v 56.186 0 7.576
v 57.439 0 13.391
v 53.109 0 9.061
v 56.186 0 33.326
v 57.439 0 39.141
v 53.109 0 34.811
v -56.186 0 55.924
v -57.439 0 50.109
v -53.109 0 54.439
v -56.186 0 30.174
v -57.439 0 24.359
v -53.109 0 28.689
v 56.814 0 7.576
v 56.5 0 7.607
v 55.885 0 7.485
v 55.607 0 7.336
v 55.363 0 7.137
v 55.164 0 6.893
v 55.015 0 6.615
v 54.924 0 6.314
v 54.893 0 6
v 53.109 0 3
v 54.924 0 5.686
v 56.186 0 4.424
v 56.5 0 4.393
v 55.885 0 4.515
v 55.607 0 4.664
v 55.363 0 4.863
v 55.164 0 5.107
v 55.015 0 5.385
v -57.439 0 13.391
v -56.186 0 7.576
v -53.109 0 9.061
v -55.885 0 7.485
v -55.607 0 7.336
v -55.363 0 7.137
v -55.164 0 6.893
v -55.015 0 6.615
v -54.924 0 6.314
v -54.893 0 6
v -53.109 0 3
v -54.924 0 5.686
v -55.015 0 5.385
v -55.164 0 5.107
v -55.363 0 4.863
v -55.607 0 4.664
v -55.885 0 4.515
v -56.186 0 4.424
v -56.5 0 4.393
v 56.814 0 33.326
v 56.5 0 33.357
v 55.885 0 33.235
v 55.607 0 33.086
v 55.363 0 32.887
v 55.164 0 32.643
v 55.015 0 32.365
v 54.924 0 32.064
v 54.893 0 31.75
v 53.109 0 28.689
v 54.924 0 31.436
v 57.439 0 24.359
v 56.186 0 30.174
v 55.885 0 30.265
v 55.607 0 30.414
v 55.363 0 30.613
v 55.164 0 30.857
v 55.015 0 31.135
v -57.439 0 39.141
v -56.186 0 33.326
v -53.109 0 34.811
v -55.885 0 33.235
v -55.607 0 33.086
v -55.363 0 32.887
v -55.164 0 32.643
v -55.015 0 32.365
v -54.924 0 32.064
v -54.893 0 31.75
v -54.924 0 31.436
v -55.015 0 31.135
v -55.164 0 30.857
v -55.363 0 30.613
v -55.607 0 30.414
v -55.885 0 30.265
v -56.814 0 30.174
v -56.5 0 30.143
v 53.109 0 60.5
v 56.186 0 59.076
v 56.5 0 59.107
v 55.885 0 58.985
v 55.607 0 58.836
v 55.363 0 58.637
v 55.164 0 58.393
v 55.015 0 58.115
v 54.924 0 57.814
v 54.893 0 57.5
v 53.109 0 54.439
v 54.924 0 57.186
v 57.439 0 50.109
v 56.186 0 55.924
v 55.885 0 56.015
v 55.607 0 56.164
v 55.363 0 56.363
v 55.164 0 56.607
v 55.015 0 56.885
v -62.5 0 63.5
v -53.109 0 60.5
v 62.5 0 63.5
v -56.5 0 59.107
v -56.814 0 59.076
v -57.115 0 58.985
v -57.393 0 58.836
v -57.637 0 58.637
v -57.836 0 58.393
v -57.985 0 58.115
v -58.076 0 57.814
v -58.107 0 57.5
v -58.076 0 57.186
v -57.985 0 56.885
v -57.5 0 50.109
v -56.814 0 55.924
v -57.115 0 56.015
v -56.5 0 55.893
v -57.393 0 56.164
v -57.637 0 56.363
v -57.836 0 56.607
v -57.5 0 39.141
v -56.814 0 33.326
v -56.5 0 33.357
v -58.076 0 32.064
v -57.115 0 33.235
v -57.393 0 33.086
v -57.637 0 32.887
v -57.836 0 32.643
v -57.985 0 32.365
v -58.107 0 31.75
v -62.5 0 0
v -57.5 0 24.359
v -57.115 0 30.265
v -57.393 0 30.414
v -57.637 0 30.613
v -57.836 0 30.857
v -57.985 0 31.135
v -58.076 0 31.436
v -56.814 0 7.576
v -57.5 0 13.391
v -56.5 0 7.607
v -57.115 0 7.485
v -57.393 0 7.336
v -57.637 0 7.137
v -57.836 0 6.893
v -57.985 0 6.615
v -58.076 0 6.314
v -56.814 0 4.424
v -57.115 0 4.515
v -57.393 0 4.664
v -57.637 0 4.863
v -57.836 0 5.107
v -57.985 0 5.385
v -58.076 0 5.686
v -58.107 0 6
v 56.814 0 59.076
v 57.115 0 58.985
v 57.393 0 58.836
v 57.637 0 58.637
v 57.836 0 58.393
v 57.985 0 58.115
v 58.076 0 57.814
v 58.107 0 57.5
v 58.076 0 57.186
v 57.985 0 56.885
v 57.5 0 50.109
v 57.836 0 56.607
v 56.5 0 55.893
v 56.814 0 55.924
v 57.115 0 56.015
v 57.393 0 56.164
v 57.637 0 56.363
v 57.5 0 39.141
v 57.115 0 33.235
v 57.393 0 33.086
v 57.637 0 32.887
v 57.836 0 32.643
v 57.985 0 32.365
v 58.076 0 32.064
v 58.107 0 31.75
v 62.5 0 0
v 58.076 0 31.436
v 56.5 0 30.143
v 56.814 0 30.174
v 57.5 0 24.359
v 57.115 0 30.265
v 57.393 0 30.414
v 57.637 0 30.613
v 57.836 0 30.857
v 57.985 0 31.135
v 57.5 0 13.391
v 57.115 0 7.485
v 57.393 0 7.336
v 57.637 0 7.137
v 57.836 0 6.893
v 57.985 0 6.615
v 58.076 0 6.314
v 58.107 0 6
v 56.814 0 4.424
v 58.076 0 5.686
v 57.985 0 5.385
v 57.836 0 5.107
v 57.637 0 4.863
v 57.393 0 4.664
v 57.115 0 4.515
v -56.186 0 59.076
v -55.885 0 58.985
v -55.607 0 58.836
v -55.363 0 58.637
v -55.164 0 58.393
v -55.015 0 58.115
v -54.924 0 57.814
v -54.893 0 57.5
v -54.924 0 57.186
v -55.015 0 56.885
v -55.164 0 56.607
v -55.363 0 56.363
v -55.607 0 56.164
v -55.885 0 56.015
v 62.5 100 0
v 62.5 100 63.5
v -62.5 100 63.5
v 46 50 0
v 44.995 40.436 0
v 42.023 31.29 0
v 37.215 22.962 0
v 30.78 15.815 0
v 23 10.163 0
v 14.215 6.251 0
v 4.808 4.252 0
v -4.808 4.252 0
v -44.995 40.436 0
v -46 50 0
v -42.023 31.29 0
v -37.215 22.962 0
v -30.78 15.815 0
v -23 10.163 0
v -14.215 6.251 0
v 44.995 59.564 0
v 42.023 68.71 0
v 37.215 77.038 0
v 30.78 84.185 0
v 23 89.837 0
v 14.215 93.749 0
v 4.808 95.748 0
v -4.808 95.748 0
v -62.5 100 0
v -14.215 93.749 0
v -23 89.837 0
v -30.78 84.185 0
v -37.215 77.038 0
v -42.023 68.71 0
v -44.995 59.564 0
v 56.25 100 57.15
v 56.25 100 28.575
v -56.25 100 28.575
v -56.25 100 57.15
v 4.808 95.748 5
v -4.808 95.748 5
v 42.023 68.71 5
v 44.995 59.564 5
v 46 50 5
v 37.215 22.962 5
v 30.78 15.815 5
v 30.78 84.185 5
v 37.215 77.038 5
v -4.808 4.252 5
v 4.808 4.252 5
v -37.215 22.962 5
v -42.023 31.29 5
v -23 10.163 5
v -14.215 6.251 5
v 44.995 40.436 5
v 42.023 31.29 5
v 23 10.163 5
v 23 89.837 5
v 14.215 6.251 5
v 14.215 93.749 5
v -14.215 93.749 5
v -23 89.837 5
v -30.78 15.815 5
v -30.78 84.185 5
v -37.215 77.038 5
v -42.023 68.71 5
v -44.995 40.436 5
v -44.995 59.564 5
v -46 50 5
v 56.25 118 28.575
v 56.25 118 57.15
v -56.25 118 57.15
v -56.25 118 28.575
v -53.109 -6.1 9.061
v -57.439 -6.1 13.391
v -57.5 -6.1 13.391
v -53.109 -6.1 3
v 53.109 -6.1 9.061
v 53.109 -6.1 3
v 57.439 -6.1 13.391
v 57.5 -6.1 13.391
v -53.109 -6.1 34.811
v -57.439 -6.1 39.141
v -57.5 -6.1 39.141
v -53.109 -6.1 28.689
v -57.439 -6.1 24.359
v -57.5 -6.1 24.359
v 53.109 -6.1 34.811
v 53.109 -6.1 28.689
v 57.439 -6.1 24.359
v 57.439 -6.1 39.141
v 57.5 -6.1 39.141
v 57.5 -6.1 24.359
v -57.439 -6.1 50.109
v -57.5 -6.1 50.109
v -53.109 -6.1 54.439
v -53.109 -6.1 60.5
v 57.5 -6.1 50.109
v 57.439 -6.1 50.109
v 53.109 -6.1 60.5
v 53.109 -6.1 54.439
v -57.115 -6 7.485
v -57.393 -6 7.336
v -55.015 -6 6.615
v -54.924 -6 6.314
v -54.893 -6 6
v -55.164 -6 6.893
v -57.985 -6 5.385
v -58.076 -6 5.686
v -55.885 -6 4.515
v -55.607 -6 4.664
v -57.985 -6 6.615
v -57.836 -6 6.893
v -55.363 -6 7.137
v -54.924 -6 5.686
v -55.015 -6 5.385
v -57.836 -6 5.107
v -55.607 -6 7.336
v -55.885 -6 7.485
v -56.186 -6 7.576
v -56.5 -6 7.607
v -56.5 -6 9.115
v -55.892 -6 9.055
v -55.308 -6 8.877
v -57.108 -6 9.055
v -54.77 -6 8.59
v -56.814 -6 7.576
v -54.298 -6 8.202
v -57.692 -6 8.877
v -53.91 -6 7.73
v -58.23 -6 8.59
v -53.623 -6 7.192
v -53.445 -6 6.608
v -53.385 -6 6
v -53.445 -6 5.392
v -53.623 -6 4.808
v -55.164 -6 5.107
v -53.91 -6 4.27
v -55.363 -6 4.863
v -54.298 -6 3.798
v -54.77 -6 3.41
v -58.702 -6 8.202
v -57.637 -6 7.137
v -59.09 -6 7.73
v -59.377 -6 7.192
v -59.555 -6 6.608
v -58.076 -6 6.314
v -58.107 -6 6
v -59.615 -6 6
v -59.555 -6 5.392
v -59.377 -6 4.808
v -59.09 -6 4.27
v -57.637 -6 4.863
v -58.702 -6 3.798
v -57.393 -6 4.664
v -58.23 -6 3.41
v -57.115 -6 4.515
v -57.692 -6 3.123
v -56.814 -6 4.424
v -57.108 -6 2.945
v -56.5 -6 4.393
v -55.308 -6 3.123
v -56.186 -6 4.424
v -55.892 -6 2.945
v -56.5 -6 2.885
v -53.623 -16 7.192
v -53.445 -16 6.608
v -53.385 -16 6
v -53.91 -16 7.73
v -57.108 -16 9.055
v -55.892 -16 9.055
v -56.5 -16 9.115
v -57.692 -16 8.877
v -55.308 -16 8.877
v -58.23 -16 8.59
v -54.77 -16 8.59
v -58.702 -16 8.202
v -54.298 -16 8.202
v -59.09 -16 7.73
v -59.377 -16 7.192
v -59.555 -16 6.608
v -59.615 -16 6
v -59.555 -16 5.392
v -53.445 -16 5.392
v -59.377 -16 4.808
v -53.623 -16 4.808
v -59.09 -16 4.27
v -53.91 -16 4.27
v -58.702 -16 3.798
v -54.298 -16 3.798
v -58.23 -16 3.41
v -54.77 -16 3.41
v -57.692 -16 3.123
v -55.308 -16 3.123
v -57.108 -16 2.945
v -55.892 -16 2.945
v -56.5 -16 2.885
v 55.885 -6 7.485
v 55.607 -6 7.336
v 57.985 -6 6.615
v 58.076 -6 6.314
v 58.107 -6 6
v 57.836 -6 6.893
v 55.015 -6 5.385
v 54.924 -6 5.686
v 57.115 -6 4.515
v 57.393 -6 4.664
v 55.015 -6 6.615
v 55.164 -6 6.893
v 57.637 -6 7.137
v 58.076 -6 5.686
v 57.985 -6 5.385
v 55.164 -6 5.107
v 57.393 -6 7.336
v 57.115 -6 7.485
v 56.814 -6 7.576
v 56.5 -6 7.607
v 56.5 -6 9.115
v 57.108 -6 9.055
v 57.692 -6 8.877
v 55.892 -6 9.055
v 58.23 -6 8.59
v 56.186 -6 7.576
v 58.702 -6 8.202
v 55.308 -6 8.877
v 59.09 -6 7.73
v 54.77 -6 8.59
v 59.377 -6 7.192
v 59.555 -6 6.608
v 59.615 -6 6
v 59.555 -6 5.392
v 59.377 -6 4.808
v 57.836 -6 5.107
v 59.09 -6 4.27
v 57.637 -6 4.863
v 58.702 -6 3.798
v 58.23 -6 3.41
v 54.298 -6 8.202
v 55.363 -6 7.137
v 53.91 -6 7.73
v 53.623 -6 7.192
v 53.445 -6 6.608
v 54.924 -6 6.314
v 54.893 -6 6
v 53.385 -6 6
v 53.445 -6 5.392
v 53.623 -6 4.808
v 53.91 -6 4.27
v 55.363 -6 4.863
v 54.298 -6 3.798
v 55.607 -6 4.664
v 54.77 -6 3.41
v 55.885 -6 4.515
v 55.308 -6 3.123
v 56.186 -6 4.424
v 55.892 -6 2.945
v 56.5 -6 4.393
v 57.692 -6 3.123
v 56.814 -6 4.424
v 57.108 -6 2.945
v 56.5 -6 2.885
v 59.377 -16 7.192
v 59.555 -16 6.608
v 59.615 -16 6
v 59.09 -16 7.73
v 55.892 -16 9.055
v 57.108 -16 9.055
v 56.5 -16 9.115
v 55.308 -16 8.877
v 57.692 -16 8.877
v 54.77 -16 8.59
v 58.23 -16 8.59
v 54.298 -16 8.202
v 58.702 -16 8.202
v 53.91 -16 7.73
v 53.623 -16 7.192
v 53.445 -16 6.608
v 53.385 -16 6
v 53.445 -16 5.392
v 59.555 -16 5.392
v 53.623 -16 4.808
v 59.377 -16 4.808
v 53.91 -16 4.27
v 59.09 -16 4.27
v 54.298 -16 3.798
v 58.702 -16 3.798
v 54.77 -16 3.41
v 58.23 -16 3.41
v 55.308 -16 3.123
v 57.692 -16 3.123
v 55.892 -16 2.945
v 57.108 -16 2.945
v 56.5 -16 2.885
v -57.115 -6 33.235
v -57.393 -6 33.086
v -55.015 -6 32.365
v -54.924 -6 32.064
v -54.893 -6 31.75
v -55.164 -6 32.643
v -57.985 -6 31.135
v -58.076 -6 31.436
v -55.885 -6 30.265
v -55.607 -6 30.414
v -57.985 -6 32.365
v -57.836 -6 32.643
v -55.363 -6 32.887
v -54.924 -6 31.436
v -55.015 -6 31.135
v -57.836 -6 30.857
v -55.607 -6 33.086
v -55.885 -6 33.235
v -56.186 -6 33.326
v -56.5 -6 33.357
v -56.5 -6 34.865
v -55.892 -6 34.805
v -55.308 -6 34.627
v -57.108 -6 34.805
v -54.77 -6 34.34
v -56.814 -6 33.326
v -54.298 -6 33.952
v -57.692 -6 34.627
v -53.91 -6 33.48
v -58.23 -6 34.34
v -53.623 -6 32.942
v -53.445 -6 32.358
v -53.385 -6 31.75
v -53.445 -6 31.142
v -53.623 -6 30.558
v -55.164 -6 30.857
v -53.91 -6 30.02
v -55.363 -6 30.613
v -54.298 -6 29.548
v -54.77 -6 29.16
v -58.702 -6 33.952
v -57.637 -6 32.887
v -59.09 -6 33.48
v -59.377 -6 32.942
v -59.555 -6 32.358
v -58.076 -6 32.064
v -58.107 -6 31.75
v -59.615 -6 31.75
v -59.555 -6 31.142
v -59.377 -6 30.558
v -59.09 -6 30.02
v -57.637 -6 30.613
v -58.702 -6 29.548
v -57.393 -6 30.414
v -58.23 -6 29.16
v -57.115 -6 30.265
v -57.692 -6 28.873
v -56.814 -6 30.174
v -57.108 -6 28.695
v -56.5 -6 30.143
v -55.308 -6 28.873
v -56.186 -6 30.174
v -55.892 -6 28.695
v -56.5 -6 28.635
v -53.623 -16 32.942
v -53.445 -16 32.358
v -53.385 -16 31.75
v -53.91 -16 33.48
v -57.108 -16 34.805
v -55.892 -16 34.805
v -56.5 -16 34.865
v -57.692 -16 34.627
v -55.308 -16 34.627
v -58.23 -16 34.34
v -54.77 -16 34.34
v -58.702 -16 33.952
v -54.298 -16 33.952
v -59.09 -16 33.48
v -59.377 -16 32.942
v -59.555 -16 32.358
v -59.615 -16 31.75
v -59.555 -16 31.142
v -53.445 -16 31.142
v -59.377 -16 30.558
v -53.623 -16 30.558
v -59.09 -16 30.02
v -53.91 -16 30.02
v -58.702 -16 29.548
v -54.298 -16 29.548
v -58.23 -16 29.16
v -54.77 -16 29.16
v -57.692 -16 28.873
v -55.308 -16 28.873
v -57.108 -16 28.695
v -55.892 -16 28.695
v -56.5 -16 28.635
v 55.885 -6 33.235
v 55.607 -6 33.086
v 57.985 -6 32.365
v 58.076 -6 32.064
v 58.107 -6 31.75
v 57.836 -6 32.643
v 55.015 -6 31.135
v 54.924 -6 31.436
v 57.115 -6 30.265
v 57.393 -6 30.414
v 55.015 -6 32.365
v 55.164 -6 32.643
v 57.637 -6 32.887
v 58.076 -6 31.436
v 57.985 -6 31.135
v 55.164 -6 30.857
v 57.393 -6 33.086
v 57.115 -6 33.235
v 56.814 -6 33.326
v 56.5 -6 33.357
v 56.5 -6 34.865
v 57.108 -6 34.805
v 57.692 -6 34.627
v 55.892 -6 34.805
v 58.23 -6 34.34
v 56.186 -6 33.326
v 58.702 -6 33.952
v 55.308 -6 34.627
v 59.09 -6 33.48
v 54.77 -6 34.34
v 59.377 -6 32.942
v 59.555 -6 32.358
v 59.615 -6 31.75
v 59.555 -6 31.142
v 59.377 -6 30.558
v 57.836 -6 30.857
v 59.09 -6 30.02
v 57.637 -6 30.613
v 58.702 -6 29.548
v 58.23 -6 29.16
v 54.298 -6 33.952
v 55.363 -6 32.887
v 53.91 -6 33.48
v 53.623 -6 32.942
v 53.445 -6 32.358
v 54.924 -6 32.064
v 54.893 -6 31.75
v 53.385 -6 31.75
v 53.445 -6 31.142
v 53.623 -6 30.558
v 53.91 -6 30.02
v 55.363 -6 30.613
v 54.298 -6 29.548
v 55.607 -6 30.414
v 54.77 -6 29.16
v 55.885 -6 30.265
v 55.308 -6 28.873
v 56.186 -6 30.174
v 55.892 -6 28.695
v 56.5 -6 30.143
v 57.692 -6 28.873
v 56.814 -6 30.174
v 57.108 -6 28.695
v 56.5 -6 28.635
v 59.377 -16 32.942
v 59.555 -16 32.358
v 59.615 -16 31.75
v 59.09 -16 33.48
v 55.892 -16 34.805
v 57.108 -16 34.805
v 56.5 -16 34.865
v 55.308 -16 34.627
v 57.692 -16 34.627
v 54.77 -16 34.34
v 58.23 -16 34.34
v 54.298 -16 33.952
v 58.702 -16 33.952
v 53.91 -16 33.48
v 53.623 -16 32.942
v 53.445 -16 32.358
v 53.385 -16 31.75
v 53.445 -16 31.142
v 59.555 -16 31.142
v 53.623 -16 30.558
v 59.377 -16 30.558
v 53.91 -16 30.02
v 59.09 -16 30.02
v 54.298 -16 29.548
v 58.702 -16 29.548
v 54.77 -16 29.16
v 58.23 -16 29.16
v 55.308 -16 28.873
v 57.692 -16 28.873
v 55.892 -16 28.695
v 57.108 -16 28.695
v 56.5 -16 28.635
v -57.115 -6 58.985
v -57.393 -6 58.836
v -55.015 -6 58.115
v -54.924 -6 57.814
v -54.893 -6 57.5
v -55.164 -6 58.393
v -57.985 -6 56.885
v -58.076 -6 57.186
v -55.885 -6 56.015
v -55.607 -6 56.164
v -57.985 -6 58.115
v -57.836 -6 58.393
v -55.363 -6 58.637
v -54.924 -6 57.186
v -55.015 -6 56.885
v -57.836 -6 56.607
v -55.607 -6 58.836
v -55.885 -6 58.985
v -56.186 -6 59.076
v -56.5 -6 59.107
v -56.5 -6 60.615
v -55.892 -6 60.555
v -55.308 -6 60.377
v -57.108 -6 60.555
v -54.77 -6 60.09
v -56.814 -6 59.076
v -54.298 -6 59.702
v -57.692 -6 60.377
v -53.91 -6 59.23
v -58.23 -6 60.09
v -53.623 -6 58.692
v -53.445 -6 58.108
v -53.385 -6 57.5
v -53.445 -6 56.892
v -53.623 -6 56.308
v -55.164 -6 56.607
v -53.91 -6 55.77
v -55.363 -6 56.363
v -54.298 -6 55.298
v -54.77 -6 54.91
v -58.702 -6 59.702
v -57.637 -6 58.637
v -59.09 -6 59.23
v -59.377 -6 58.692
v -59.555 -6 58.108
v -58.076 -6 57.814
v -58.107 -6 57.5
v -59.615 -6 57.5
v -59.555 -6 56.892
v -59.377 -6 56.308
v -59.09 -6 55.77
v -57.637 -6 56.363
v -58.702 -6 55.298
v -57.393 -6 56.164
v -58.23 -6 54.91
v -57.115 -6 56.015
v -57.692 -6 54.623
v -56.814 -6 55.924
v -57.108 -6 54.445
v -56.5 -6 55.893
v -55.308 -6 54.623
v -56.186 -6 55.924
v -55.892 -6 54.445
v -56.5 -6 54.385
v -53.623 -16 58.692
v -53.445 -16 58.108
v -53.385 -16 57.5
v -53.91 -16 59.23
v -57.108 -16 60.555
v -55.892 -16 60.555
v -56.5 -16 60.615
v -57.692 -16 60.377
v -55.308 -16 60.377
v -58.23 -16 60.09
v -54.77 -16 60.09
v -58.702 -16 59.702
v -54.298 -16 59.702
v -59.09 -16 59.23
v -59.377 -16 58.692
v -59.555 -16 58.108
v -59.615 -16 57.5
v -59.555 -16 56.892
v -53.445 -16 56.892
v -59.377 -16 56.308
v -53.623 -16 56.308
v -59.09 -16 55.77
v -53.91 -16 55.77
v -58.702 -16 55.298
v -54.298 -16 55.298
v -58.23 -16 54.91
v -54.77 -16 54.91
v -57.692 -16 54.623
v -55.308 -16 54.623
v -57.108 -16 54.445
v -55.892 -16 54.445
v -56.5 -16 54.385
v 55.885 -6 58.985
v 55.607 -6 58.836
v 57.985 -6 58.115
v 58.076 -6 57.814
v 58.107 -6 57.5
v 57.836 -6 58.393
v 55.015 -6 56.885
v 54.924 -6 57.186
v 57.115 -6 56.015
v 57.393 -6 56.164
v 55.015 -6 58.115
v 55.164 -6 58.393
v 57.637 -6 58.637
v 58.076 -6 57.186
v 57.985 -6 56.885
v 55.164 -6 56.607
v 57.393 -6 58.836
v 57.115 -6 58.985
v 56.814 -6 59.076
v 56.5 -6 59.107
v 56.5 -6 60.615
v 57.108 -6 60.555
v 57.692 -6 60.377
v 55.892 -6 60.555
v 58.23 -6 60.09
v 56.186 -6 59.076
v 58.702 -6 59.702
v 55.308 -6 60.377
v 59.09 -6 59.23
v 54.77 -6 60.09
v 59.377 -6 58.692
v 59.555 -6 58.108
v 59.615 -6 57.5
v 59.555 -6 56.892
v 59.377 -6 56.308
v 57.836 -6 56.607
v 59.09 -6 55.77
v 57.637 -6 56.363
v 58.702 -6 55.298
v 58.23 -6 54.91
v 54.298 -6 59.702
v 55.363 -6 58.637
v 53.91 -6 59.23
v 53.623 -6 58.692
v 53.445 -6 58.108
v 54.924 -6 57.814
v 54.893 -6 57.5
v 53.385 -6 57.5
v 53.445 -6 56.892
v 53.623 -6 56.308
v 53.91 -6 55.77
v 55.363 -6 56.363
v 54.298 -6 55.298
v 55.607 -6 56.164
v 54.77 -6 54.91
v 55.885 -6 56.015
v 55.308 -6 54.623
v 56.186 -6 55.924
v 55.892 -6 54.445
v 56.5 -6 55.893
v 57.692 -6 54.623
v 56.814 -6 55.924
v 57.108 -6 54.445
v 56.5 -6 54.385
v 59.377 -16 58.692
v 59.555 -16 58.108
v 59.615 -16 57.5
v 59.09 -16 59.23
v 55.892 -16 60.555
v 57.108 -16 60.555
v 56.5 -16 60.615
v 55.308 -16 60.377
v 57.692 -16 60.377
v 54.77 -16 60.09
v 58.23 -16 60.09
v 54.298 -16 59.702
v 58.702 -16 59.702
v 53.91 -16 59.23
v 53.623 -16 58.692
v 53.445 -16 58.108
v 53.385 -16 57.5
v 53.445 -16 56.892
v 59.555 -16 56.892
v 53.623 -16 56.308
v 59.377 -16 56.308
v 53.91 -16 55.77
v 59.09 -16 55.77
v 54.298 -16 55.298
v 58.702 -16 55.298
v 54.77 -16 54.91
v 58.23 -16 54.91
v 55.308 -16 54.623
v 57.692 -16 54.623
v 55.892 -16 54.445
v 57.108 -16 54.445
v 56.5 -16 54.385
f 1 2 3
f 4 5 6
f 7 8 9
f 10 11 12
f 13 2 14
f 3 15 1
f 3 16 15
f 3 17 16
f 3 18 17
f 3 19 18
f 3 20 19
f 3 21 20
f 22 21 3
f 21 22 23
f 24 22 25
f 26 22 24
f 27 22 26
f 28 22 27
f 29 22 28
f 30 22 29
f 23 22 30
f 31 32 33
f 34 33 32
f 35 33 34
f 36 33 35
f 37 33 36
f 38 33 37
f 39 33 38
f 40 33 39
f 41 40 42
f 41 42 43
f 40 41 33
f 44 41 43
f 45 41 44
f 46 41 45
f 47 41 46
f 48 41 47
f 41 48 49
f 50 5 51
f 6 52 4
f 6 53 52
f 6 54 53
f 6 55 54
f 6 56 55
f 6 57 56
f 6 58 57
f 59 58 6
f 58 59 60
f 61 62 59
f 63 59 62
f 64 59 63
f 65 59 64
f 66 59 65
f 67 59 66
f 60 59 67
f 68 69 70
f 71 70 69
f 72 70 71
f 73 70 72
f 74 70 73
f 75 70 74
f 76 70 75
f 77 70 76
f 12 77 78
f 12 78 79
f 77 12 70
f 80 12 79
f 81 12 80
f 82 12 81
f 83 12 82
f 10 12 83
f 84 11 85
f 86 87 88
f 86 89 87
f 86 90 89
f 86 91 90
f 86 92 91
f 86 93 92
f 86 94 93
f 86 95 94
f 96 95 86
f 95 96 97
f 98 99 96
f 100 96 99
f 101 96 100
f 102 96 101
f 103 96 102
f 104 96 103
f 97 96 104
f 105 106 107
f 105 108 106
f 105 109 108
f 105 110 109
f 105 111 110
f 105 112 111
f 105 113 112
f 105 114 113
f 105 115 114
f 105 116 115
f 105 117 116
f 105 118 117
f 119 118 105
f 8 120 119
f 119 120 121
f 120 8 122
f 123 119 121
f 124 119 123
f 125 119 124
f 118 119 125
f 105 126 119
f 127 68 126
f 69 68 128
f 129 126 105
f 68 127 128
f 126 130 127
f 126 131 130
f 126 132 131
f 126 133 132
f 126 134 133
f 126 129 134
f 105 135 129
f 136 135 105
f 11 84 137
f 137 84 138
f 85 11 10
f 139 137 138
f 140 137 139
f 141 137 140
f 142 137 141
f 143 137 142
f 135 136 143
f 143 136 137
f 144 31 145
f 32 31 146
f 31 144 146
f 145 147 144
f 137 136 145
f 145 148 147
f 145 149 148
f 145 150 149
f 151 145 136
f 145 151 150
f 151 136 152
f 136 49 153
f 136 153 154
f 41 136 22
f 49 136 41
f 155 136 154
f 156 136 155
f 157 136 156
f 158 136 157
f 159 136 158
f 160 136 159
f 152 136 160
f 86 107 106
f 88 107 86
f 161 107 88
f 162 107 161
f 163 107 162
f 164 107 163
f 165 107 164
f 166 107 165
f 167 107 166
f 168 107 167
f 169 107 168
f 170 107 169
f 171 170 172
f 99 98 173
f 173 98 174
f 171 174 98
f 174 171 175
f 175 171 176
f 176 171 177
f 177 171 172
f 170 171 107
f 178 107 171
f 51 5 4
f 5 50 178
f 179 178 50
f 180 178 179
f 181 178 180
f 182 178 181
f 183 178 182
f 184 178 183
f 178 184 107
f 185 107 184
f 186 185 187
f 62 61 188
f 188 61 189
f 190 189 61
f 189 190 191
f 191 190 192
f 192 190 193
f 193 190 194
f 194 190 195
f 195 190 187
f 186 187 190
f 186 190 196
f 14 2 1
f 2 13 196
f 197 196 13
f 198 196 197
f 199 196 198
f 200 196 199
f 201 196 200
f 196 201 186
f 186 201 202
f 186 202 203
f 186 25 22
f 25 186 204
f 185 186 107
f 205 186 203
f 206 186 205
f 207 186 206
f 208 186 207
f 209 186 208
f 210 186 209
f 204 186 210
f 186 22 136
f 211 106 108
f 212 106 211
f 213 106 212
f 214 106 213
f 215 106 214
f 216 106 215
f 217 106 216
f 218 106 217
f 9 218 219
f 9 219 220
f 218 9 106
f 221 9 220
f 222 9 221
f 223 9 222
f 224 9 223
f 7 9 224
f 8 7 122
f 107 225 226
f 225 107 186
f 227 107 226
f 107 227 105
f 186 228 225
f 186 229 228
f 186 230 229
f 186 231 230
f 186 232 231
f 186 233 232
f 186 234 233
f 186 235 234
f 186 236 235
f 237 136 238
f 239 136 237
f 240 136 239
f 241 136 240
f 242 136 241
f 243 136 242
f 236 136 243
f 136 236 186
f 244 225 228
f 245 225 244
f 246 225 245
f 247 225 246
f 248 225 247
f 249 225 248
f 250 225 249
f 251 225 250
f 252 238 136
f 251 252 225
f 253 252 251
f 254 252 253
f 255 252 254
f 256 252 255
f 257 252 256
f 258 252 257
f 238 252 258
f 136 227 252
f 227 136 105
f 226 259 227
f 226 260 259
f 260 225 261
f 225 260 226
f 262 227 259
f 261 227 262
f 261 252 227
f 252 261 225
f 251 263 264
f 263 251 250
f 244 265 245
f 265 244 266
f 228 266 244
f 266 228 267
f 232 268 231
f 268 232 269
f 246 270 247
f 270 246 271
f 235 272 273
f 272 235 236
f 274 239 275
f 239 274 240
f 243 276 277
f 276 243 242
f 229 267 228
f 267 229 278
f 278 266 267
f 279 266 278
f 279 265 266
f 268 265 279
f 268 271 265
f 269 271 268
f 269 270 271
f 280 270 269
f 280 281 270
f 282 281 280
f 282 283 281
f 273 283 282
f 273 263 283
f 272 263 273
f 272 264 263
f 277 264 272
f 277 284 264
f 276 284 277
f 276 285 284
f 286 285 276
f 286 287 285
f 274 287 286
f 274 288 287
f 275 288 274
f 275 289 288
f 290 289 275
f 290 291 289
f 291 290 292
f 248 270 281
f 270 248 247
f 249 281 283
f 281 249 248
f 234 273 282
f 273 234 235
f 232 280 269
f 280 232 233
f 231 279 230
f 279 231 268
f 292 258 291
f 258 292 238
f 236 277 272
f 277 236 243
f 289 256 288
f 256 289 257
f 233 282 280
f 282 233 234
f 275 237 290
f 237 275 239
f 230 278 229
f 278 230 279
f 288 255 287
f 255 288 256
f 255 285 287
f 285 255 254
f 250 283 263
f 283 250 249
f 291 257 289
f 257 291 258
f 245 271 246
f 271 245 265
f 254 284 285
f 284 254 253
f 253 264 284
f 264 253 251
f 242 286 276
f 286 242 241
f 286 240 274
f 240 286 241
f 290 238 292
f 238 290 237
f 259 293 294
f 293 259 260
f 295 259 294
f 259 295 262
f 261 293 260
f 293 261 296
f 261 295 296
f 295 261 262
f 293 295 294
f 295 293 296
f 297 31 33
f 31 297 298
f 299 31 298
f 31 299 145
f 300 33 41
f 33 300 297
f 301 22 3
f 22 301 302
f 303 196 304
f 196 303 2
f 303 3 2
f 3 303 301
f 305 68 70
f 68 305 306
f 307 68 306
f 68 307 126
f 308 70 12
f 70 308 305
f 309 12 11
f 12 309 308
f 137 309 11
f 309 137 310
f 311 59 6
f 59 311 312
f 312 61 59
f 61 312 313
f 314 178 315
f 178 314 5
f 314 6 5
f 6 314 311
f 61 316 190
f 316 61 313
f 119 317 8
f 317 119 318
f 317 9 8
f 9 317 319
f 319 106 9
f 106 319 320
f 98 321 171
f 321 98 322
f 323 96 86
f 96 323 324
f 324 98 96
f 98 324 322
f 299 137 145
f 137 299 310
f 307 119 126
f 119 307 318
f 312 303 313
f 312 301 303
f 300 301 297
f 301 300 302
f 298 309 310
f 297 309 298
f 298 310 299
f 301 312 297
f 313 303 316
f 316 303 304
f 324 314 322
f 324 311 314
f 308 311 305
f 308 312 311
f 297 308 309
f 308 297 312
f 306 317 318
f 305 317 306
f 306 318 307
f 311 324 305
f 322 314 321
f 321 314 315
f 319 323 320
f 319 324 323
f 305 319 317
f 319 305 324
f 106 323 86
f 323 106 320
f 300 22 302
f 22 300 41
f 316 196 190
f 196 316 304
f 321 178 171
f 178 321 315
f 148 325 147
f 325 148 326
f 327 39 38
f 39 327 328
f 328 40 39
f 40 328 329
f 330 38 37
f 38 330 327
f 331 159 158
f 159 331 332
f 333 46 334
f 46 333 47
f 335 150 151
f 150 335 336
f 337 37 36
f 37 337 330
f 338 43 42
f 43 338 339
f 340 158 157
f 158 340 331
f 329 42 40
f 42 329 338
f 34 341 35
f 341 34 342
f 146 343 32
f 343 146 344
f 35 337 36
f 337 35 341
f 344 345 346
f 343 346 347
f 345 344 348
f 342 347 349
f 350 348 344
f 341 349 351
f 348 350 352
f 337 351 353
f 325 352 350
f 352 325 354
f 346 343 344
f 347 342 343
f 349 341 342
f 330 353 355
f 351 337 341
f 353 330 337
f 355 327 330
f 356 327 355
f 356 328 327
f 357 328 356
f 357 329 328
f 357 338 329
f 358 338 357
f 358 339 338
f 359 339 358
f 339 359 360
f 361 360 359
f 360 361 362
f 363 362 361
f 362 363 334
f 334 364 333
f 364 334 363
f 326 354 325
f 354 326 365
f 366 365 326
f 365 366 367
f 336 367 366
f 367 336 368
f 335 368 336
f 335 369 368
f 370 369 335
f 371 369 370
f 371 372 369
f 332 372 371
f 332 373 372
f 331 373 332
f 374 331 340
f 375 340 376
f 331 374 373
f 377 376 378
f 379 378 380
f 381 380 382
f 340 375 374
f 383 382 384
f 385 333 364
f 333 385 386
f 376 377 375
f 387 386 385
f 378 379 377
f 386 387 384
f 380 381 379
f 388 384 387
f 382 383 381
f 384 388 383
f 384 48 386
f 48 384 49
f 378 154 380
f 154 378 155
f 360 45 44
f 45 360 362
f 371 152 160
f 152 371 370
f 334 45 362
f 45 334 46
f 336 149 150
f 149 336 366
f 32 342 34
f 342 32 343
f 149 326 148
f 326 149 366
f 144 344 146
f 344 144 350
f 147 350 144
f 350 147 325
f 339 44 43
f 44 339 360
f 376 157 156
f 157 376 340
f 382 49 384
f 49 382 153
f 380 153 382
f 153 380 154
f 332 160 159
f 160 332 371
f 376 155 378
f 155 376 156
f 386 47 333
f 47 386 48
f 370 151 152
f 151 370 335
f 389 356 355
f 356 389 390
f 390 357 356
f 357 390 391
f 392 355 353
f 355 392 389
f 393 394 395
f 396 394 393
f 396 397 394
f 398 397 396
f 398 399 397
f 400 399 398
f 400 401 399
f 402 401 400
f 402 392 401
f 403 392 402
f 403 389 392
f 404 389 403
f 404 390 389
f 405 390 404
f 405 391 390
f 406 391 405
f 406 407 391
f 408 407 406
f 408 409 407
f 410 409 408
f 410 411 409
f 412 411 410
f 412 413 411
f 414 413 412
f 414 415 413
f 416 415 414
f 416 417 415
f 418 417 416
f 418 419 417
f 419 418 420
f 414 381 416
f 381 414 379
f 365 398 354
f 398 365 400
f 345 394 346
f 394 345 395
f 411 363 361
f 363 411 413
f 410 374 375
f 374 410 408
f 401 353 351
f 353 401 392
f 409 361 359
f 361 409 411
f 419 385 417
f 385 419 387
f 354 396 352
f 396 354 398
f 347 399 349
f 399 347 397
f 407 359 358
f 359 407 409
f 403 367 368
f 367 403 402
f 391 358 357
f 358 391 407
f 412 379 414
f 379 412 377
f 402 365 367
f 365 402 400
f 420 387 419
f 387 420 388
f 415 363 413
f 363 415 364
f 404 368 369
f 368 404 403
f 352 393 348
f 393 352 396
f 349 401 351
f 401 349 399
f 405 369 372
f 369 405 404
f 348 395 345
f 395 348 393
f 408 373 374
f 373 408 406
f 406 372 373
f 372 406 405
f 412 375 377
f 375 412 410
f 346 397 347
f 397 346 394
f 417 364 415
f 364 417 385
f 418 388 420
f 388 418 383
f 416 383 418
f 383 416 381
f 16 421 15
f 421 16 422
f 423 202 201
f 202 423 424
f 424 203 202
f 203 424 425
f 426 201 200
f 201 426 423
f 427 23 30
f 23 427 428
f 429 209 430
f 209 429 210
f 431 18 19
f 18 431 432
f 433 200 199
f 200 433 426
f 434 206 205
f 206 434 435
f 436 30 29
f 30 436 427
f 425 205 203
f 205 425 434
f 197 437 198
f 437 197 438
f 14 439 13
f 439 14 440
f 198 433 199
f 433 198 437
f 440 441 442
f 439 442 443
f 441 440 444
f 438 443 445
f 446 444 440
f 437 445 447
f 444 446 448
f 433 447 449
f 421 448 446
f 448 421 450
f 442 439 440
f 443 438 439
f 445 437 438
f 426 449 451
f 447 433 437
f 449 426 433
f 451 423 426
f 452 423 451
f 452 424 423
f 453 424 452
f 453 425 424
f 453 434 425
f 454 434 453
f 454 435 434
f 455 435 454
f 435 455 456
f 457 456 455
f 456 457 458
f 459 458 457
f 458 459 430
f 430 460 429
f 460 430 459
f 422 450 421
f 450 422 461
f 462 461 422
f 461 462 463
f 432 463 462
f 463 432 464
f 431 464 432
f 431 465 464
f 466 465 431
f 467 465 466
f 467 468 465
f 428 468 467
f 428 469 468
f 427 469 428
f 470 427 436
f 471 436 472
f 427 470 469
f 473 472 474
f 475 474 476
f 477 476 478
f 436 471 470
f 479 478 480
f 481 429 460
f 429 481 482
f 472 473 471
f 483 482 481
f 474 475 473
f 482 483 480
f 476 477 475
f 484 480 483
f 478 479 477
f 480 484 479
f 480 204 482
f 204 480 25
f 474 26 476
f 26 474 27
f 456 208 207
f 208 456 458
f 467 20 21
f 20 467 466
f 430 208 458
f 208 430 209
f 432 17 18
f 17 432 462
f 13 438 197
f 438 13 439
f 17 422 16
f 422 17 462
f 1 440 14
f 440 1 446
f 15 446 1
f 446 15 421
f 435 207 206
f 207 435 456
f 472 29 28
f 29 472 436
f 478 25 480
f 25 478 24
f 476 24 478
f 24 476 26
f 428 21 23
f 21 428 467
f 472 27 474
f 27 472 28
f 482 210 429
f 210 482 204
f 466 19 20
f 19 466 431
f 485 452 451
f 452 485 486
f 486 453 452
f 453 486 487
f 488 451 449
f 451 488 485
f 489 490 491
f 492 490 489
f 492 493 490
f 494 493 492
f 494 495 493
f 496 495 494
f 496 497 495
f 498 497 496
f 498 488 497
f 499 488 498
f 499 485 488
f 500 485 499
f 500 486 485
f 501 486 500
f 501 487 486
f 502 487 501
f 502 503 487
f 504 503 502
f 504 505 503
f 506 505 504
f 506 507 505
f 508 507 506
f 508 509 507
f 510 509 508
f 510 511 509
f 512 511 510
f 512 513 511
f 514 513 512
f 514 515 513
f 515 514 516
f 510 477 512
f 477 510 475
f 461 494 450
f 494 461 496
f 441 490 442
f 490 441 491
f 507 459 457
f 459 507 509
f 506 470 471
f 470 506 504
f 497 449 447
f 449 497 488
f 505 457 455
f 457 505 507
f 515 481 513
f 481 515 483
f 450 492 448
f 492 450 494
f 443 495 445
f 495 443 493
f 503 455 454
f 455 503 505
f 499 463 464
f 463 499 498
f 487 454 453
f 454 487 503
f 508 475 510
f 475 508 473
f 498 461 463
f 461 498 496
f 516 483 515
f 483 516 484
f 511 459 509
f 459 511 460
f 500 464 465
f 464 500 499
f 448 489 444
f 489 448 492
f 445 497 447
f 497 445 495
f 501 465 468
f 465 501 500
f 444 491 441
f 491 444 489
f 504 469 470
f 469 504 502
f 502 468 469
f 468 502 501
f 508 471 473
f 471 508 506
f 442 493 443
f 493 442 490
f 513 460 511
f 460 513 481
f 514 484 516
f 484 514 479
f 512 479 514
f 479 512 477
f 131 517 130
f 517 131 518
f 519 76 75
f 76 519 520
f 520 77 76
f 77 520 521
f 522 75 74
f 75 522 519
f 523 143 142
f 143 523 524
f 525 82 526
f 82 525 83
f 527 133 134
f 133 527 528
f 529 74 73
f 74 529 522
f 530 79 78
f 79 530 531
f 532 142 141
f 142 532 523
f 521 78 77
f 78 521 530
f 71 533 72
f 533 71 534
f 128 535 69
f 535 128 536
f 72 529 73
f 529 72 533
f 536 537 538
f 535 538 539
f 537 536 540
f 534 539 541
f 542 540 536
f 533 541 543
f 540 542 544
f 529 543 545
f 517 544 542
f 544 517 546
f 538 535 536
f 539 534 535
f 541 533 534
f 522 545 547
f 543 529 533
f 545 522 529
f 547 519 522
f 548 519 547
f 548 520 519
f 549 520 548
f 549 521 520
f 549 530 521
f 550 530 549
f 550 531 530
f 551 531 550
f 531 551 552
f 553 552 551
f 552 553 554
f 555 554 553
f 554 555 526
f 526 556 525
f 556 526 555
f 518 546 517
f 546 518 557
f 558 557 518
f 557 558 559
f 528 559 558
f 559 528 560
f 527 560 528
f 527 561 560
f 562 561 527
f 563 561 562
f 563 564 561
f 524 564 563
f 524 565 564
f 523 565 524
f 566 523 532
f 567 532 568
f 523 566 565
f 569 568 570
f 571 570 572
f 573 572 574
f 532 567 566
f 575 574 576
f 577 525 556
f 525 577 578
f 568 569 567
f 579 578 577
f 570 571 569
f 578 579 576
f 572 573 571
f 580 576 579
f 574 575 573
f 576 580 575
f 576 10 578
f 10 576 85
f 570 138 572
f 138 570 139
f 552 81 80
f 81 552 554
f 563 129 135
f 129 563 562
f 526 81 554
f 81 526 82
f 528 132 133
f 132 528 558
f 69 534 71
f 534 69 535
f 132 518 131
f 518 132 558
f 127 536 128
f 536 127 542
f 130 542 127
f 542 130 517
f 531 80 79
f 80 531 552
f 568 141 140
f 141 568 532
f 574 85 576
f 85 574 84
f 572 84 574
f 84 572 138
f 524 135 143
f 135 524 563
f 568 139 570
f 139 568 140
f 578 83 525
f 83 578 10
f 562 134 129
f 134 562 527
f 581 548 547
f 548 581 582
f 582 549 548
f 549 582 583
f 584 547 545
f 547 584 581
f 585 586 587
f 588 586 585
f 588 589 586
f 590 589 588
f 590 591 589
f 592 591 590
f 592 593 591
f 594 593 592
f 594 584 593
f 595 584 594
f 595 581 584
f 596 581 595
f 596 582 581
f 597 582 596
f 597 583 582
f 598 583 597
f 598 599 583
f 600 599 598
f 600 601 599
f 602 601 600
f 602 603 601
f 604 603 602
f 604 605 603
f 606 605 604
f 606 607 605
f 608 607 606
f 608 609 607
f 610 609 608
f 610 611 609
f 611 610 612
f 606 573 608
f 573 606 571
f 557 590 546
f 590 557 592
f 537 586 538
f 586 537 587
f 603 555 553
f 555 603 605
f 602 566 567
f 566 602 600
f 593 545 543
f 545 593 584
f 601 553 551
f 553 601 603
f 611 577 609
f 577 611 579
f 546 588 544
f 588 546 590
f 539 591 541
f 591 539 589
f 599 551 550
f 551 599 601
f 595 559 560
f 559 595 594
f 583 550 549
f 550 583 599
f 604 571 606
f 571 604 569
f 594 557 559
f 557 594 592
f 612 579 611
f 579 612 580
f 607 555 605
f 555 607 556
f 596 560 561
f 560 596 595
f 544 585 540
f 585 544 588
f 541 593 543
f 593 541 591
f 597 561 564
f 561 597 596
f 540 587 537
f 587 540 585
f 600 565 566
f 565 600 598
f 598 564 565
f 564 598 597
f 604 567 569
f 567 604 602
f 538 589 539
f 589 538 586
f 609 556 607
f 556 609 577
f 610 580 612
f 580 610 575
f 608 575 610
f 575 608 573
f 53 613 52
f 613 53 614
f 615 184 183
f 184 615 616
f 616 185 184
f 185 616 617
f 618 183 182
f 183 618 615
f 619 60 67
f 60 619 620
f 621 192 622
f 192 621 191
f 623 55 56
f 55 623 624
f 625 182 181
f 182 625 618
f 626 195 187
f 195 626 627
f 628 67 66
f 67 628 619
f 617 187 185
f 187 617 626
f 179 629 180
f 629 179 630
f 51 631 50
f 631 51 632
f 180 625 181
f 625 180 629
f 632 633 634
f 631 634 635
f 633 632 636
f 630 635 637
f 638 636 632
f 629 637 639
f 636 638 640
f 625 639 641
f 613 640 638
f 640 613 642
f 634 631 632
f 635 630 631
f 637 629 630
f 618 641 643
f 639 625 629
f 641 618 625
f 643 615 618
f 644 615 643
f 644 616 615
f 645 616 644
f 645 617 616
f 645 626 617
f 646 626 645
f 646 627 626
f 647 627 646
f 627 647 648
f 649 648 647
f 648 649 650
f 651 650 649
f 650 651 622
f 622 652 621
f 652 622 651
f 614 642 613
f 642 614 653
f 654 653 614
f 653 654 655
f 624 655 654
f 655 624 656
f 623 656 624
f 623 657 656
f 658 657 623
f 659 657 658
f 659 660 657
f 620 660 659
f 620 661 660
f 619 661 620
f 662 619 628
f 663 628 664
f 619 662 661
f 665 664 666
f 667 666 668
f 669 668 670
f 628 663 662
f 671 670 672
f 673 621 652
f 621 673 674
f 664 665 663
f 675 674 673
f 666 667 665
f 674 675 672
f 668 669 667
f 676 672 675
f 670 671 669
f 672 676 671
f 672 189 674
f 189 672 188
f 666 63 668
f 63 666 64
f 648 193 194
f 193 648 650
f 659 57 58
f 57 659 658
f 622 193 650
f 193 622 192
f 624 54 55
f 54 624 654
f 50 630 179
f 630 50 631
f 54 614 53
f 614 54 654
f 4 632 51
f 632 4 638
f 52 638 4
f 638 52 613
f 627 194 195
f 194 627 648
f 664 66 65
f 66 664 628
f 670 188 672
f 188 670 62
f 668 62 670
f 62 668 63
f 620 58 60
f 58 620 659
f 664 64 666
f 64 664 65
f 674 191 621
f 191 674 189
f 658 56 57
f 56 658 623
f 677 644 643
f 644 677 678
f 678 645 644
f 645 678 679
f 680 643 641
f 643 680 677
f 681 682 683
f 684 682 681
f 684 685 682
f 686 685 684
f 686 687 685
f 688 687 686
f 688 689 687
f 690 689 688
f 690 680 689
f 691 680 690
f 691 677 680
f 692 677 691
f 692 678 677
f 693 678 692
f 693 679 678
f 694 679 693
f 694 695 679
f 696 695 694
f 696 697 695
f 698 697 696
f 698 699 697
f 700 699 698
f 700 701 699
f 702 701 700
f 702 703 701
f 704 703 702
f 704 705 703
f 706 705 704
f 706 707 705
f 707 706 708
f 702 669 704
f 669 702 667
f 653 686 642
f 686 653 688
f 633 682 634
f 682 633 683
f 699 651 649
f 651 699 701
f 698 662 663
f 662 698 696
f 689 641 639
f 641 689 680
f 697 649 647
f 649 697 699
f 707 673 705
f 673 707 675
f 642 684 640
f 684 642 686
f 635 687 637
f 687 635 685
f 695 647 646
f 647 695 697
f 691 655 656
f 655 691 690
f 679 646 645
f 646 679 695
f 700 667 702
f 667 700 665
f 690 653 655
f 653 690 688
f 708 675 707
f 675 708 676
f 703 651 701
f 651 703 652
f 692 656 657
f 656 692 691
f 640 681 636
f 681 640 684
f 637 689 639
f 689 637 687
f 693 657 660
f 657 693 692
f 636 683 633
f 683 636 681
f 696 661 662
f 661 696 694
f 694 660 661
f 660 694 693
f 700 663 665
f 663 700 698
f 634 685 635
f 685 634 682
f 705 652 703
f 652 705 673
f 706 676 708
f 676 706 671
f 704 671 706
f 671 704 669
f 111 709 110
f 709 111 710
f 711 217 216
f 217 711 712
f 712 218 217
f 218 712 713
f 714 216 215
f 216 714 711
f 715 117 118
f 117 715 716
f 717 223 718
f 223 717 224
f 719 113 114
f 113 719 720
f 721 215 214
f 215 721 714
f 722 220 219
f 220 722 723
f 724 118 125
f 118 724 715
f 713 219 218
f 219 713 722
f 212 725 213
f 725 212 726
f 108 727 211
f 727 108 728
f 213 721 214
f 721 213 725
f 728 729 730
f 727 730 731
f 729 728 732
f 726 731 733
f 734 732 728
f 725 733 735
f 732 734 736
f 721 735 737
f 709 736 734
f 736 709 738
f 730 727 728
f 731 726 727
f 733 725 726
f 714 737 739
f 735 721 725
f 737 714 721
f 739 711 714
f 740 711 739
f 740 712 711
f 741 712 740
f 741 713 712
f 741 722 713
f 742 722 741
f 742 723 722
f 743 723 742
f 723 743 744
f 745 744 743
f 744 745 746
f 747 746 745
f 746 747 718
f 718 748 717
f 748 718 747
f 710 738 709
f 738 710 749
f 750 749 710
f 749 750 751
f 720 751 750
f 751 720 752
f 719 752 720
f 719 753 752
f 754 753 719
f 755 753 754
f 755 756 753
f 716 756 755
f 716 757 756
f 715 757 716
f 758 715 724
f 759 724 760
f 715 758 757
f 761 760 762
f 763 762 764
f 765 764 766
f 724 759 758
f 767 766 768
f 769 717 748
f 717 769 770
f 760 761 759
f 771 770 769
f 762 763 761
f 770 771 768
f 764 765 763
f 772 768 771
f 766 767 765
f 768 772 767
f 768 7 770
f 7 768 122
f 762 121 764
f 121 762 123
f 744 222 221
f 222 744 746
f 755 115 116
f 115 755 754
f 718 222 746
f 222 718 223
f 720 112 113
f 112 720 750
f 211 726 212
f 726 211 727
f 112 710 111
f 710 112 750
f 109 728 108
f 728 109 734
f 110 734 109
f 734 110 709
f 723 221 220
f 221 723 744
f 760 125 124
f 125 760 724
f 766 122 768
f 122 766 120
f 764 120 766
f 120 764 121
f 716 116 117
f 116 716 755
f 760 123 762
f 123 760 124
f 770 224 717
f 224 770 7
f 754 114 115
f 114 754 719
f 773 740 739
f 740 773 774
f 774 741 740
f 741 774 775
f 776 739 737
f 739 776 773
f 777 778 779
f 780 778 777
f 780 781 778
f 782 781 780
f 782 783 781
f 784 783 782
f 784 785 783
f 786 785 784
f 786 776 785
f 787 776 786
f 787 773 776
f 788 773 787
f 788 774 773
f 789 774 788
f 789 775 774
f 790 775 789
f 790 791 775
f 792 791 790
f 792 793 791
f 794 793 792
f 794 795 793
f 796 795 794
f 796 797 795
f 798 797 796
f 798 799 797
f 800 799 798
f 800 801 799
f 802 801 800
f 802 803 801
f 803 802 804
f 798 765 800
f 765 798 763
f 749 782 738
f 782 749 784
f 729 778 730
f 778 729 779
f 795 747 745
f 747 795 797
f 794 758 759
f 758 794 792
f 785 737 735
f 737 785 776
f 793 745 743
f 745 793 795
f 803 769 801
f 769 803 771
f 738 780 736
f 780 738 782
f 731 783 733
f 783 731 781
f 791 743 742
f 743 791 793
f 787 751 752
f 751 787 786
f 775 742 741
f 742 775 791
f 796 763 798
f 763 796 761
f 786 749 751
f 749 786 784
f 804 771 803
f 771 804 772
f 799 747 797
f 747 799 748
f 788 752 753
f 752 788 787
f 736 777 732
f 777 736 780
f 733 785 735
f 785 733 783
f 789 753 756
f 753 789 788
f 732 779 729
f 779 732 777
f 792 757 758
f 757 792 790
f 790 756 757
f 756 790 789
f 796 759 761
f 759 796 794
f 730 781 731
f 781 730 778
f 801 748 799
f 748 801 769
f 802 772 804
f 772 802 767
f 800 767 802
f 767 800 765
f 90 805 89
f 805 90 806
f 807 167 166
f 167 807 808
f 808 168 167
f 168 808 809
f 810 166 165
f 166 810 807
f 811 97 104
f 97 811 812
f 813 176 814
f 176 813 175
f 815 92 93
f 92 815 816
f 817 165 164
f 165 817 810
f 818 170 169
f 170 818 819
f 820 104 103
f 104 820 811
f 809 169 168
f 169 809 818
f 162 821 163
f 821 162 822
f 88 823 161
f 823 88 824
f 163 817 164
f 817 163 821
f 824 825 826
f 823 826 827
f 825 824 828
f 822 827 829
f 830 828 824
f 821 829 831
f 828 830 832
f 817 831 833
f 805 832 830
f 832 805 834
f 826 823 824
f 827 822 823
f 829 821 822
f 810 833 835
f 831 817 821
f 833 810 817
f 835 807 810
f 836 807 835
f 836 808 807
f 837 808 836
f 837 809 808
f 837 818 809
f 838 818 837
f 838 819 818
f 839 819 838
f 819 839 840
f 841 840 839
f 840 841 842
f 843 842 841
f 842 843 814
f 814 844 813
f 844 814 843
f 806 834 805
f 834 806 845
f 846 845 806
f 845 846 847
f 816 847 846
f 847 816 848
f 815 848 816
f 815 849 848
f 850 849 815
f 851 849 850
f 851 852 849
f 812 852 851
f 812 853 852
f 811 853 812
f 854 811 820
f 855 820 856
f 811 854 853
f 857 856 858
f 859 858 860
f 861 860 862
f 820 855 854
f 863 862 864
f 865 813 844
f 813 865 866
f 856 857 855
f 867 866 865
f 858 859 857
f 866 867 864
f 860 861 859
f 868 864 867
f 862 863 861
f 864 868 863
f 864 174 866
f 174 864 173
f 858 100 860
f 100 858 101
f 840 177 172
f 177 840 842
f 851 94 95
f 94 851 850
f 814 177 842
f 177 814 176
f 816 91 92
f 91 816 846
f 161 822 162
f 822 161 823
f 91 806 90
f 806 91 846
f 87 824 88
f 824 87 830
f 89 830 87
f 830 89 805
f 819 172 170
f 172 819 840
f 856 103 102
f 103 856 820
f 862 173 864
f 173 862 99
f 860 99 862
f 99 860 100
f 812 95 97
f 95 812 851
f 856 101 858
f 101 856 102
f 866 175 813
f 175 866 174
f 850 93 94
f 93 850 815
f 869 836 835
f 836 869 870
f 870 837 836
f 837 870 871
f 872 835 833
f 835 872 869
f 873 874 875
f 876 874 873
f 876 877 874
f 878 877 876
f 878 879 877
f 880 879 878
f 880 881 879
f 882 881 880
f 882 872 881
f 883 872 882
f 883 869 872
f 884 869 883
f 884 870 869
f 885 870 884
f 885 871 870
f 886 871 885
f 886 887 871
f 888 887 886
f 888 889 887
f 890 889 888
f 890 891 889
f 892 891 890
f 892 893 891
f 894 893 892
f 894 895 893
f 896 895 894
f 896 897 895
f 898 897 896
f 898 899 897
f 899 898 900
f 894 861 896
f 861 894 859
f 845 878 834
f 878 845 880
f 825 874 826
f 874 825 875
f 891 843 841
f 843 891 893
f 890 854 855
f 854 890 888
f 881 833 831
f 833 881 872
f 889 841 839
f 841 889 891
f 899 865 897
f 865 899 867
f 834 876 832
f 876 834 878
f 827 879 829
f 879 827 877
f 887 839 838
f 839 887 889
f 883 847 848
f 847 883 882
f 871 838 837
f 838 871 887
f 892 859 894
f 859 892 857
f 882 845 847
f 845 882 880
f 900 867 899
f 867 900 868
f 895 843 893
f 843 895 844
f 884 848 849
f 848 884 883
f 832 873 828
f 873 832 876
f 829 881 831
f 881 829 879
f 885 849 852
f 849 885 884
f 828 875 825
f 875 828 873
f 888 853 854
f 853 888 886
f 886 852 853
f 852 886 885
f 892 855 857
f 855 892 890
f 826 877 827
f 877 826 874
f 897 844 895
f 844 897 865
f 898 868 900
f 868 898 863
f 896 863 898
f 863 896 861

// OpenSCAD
// file: zcube.scad
// This function creates a cube with a given x/y either above (f=1) or below (f=-1) the z axis.
module zcube(dimensions, z=0, f=1) {
	translate([0, 0, dimensions[2]/2 * f + z]) cube(dimensions, true);
}

module zring(dimensions, thickness, z=0, f=1) {
	render() difference() {
		zcube([dimensions[0]+thickness/2, dimensions[1]+thickness/2, dimensions[2]], z=z, f=f);
		zcube([dimensions[0]-thickness/2, dimensions[1]-thickness/2, dimensions[2]], z=z, f=f);
	}
}

module rcube(dimensions, d = 1, z=0, f=1) {
	dx = dimensions[0]/2 - d/2;
	dy = dimensions[1]/2 - d/2;
	dz = dimensions[2]/2 * (f-1) + z;
	
	hull() {
		translate([-dx, -dy, dz]) cylinder(h=dimensions[2], d=d);
		translate([-dx, dy, dz]) cylinder(h=dimensions[2], d=d);
		translate([dx, -dy, dz]) cylinder(h=dimensions[2], d=d);
		translate([dx, dy, dz]) cylinder(h=dimensions[2], d=d);
	}
}

module zcorners() {
	children();
	mirror([1, 0, 0]) children();
	mirror([0, 1, 0]) children();
	mirror([1, 0, 0]) mirror([0, 1, 0]) children();
}

module reflect(axis = [1, 0, 0]) {
	children();
	mirror(axis) children();
}

module zsides(dimensions, thickness, inset=0) {
	difference() {
		zcube(dimensions + [thickness*2, thickness*2, 0]);
		zcube(dimensions);
	}
}
// file: bolts.scad
$radial_error = 0.1;

$fn = $preview ? 12 : 32;

ISO262_COARSE_PITCH = [
	[1.0, 0.25],
	[1.2, 0.25],
	[1.4, 0.2],
	[1.6, 0.35],
	[1.8, 0.2],
	[2.0, 0.4],
	[2.5, 0.45],
	[3.0, 0.5],
	[3.5, 0.35],
	[4.0, 0.7],
	[5.0, 0.8],
	[6.0, 1.0],
	[7.0, 0.75],
	[8.0, 1.25],
	[10.0, 1.5],
	[12.0, 1.75],
	[14.0, 1.5],
	[16.0, 2.0],
	[30.0, 3.5],
	[42.0, 4.5],
	[56.0, 5.5]
];

function screw_pitch(d) = lookup(d, ISO262_COARSE_PITCH);

module cylinder_outer(height, radius, fn=$fn, radial_error=$radial_error) {
	fudge = 1/cos(180/fn);
	cylinder(h=height,r=radius*fudge+$radial_error, $fn=fn);
}

module cylinder_inner(height, radius, fn=$fn) {
	cylinder(h=height,r=radius-$radial_error,$fn=fn);
}

// Make a hole. The diameter is the size of the screw (e.g. 3 for M3). Depth is how far the hole should go for the thread, and inset is how far out there should be a hole for the head to go.
module hole(diameter=3, depth=6, inset=10, pitch=0) {
	cylinder_outer(depth, (diameter-pitch)/2);
	translate([0, 0, depth]) cylinder_outer(inset, diameter, 32);
}

module threaded_hole(diameter=3, depth=6, inset=10) {
	hole(diameter, depth, inset, screw_pitch(diameter));
}

module countersunk_hole(diameter=3, depth=6, inset=10, pitch=0) {
	hole(diameter, depth, inset, pitch);
	translate([0, 0, depth-diameter/2]) cylinder(r1=diameter/2+$radial_error, r2=diameter+$radial_error, h=diameter/2);
}

module knurled_insert(diameter = 3, depth = 6, thickness = 1) {
	cylinder_inner(depth, diameter/2 + thickness);
}

module knurled_hole(diameter = 3, depth = 6, inset = 10, insert = 4, thickness = 1) {
	hole(diameter, depth, inset);
	
	knurled_insert(diameter, insert, thickness);
}

module countersunk_knurled_hole(diameter = 3, depth = 6, inset = 10, insert = 4, thickness = 1) {
	countersunk_hole(diameter, depth, inset);
	
	knurled_insert(diameter, insert, thickness);
}

// Make a hole for a bolt/screw combination.
module bolted_hole(diameter=3, depth=8, nut_offset=2, shaft_length=10, inset=10) {
	hole(diameter, depth, inset);
	hull() {
		shaft_width = diameter;
		translate([0, 0, nut_offset]) rotate(360/12, [0, 0, 1]) cylinder_outer(diameter, shaft_width, 6);
		translate([0, shaft_length, nut_offset]) rotate(360/12, [0, 0, 1]) cylinder_outer(diameter, shaft_width, 6);
	}
}

module countersunk_bolted_hole(diameter=3, depth=8, nut_offset=2, shaft_length=10, inset=10) {
	countersunk_hole(diameter, depth, inset);
	hull() {
		shaft_width = diameter;
		translate([0, 0, nut_offset]) rotate(360/12, [0, 0, 1]) cylinder_outer(diameter, shaft_width, 6);
		translate([0, shaft_length, nut_offset]) rotate(360/12, [0, 0, 1]) cylinder_outer(diameter, shaft_width, 6);
	}
}

module mounting_hole(diameter=3, depth=6, inset=10, outset=3) {
	difference() {
		cylinder_outer(depth, diameter/2+outset);
		hole(diameter=diameter, depth=depth, inset=inset);
	}
}

render() rotate(90, [1, 0, 0]) difference() {
	cube([40, 10, 10]);
	translate([5, 5, 0]) bolted_hole(diameter=3, depth=8);
	translate([15, 5, 0]) bolted_hole(diameter=4, depth=8);
	translate([25, 5, 0]) countersunk_hole(diameter=4, depth=8);
	translate([35, 5, 0]) knurled_hole();
}

!render() rotate(90, [1, 0, 0]) difference() {
	cube([6*4, 12, 12]);
	translate([6, 6, 0]) hole(diameter=5, depth=8);
	translate([6*3, 6, 0]) hole(diameter=5.5, depth=8);
}
// main file
/*
	- Hole sizes confirmed.
	- Spacing sizes confirmed.
*/

use <bolts.scad>;
use <zcube.scad>;

sfx_dimensions = [125, 100, 63.5];
//sfx_dimensions = [150, 140, 86];

module sfx(dimensions = sfx_dimensions) {
	difference() {
		color("grey") translate([-dimensions[0]/2, 0, 0]) cube(dimensions);
		sfx_holes() rotate(90, [1, 0, 0]) hole(3, 10);
		
		translate([0, dimensions[1]/2, 0]) cylinder(d=92,h=5);
	}
	
	scale([0.9, 1.0, 0.9])
	translate([0, dimensions[1]+9, dimensions[2]/2])
	zcube([dimensions[0], 18, dimensions[2]/2]);
}

module sfx_holes(inset = 6, f = 1.0, dimensions = sfx_dimensions) {
	width = dimensions[0];
	height = dimensions[2];
	
	translate([-width/2+inset, 0, inset*f]) children();
	translate([width/2-inset, 0, inset*f]) children();
	
	translate([-width/2+inset, 0, height/2]) children();
	translate([width/2-inset, 0, height/2]) children();
	
	translate([-width/2+inset, 0, height-(inset*f)]) children();
	translate([width/2-inset, 0, height-(inset*f)]) children();
}

module sfx_cutout(thickness = 6, dimensions = sfx_dimensions) {
	render() difference() {
		color("grey") translate([0, 0.1, dimensions[2]/2]) rotate([90, 0, 0]) zcube([dimensions[0]-10, dimensions[2]-6, thickness+0.2]);
		
		sfx_holes(inset=2, f=3) rotate([90, 360/16, 0]) translate([0, 0, -1]) cylinder(h=thickness+2, r=8, $fn = 8);
	}
	
	sfx_holes() translate([0, 30-thickness, 0]) rotate([90, 0, 0]) hole(3, 30);
}

module sfx_offset(x = 0, y = 0.5, dimensions = sfx_dimensions) {
	translate([dimensions[0]*x, 0, -dimensions[2]]) children();
}

//sfx_offset() {
	sfx();
	color("red") sfx_cutout();
//}
